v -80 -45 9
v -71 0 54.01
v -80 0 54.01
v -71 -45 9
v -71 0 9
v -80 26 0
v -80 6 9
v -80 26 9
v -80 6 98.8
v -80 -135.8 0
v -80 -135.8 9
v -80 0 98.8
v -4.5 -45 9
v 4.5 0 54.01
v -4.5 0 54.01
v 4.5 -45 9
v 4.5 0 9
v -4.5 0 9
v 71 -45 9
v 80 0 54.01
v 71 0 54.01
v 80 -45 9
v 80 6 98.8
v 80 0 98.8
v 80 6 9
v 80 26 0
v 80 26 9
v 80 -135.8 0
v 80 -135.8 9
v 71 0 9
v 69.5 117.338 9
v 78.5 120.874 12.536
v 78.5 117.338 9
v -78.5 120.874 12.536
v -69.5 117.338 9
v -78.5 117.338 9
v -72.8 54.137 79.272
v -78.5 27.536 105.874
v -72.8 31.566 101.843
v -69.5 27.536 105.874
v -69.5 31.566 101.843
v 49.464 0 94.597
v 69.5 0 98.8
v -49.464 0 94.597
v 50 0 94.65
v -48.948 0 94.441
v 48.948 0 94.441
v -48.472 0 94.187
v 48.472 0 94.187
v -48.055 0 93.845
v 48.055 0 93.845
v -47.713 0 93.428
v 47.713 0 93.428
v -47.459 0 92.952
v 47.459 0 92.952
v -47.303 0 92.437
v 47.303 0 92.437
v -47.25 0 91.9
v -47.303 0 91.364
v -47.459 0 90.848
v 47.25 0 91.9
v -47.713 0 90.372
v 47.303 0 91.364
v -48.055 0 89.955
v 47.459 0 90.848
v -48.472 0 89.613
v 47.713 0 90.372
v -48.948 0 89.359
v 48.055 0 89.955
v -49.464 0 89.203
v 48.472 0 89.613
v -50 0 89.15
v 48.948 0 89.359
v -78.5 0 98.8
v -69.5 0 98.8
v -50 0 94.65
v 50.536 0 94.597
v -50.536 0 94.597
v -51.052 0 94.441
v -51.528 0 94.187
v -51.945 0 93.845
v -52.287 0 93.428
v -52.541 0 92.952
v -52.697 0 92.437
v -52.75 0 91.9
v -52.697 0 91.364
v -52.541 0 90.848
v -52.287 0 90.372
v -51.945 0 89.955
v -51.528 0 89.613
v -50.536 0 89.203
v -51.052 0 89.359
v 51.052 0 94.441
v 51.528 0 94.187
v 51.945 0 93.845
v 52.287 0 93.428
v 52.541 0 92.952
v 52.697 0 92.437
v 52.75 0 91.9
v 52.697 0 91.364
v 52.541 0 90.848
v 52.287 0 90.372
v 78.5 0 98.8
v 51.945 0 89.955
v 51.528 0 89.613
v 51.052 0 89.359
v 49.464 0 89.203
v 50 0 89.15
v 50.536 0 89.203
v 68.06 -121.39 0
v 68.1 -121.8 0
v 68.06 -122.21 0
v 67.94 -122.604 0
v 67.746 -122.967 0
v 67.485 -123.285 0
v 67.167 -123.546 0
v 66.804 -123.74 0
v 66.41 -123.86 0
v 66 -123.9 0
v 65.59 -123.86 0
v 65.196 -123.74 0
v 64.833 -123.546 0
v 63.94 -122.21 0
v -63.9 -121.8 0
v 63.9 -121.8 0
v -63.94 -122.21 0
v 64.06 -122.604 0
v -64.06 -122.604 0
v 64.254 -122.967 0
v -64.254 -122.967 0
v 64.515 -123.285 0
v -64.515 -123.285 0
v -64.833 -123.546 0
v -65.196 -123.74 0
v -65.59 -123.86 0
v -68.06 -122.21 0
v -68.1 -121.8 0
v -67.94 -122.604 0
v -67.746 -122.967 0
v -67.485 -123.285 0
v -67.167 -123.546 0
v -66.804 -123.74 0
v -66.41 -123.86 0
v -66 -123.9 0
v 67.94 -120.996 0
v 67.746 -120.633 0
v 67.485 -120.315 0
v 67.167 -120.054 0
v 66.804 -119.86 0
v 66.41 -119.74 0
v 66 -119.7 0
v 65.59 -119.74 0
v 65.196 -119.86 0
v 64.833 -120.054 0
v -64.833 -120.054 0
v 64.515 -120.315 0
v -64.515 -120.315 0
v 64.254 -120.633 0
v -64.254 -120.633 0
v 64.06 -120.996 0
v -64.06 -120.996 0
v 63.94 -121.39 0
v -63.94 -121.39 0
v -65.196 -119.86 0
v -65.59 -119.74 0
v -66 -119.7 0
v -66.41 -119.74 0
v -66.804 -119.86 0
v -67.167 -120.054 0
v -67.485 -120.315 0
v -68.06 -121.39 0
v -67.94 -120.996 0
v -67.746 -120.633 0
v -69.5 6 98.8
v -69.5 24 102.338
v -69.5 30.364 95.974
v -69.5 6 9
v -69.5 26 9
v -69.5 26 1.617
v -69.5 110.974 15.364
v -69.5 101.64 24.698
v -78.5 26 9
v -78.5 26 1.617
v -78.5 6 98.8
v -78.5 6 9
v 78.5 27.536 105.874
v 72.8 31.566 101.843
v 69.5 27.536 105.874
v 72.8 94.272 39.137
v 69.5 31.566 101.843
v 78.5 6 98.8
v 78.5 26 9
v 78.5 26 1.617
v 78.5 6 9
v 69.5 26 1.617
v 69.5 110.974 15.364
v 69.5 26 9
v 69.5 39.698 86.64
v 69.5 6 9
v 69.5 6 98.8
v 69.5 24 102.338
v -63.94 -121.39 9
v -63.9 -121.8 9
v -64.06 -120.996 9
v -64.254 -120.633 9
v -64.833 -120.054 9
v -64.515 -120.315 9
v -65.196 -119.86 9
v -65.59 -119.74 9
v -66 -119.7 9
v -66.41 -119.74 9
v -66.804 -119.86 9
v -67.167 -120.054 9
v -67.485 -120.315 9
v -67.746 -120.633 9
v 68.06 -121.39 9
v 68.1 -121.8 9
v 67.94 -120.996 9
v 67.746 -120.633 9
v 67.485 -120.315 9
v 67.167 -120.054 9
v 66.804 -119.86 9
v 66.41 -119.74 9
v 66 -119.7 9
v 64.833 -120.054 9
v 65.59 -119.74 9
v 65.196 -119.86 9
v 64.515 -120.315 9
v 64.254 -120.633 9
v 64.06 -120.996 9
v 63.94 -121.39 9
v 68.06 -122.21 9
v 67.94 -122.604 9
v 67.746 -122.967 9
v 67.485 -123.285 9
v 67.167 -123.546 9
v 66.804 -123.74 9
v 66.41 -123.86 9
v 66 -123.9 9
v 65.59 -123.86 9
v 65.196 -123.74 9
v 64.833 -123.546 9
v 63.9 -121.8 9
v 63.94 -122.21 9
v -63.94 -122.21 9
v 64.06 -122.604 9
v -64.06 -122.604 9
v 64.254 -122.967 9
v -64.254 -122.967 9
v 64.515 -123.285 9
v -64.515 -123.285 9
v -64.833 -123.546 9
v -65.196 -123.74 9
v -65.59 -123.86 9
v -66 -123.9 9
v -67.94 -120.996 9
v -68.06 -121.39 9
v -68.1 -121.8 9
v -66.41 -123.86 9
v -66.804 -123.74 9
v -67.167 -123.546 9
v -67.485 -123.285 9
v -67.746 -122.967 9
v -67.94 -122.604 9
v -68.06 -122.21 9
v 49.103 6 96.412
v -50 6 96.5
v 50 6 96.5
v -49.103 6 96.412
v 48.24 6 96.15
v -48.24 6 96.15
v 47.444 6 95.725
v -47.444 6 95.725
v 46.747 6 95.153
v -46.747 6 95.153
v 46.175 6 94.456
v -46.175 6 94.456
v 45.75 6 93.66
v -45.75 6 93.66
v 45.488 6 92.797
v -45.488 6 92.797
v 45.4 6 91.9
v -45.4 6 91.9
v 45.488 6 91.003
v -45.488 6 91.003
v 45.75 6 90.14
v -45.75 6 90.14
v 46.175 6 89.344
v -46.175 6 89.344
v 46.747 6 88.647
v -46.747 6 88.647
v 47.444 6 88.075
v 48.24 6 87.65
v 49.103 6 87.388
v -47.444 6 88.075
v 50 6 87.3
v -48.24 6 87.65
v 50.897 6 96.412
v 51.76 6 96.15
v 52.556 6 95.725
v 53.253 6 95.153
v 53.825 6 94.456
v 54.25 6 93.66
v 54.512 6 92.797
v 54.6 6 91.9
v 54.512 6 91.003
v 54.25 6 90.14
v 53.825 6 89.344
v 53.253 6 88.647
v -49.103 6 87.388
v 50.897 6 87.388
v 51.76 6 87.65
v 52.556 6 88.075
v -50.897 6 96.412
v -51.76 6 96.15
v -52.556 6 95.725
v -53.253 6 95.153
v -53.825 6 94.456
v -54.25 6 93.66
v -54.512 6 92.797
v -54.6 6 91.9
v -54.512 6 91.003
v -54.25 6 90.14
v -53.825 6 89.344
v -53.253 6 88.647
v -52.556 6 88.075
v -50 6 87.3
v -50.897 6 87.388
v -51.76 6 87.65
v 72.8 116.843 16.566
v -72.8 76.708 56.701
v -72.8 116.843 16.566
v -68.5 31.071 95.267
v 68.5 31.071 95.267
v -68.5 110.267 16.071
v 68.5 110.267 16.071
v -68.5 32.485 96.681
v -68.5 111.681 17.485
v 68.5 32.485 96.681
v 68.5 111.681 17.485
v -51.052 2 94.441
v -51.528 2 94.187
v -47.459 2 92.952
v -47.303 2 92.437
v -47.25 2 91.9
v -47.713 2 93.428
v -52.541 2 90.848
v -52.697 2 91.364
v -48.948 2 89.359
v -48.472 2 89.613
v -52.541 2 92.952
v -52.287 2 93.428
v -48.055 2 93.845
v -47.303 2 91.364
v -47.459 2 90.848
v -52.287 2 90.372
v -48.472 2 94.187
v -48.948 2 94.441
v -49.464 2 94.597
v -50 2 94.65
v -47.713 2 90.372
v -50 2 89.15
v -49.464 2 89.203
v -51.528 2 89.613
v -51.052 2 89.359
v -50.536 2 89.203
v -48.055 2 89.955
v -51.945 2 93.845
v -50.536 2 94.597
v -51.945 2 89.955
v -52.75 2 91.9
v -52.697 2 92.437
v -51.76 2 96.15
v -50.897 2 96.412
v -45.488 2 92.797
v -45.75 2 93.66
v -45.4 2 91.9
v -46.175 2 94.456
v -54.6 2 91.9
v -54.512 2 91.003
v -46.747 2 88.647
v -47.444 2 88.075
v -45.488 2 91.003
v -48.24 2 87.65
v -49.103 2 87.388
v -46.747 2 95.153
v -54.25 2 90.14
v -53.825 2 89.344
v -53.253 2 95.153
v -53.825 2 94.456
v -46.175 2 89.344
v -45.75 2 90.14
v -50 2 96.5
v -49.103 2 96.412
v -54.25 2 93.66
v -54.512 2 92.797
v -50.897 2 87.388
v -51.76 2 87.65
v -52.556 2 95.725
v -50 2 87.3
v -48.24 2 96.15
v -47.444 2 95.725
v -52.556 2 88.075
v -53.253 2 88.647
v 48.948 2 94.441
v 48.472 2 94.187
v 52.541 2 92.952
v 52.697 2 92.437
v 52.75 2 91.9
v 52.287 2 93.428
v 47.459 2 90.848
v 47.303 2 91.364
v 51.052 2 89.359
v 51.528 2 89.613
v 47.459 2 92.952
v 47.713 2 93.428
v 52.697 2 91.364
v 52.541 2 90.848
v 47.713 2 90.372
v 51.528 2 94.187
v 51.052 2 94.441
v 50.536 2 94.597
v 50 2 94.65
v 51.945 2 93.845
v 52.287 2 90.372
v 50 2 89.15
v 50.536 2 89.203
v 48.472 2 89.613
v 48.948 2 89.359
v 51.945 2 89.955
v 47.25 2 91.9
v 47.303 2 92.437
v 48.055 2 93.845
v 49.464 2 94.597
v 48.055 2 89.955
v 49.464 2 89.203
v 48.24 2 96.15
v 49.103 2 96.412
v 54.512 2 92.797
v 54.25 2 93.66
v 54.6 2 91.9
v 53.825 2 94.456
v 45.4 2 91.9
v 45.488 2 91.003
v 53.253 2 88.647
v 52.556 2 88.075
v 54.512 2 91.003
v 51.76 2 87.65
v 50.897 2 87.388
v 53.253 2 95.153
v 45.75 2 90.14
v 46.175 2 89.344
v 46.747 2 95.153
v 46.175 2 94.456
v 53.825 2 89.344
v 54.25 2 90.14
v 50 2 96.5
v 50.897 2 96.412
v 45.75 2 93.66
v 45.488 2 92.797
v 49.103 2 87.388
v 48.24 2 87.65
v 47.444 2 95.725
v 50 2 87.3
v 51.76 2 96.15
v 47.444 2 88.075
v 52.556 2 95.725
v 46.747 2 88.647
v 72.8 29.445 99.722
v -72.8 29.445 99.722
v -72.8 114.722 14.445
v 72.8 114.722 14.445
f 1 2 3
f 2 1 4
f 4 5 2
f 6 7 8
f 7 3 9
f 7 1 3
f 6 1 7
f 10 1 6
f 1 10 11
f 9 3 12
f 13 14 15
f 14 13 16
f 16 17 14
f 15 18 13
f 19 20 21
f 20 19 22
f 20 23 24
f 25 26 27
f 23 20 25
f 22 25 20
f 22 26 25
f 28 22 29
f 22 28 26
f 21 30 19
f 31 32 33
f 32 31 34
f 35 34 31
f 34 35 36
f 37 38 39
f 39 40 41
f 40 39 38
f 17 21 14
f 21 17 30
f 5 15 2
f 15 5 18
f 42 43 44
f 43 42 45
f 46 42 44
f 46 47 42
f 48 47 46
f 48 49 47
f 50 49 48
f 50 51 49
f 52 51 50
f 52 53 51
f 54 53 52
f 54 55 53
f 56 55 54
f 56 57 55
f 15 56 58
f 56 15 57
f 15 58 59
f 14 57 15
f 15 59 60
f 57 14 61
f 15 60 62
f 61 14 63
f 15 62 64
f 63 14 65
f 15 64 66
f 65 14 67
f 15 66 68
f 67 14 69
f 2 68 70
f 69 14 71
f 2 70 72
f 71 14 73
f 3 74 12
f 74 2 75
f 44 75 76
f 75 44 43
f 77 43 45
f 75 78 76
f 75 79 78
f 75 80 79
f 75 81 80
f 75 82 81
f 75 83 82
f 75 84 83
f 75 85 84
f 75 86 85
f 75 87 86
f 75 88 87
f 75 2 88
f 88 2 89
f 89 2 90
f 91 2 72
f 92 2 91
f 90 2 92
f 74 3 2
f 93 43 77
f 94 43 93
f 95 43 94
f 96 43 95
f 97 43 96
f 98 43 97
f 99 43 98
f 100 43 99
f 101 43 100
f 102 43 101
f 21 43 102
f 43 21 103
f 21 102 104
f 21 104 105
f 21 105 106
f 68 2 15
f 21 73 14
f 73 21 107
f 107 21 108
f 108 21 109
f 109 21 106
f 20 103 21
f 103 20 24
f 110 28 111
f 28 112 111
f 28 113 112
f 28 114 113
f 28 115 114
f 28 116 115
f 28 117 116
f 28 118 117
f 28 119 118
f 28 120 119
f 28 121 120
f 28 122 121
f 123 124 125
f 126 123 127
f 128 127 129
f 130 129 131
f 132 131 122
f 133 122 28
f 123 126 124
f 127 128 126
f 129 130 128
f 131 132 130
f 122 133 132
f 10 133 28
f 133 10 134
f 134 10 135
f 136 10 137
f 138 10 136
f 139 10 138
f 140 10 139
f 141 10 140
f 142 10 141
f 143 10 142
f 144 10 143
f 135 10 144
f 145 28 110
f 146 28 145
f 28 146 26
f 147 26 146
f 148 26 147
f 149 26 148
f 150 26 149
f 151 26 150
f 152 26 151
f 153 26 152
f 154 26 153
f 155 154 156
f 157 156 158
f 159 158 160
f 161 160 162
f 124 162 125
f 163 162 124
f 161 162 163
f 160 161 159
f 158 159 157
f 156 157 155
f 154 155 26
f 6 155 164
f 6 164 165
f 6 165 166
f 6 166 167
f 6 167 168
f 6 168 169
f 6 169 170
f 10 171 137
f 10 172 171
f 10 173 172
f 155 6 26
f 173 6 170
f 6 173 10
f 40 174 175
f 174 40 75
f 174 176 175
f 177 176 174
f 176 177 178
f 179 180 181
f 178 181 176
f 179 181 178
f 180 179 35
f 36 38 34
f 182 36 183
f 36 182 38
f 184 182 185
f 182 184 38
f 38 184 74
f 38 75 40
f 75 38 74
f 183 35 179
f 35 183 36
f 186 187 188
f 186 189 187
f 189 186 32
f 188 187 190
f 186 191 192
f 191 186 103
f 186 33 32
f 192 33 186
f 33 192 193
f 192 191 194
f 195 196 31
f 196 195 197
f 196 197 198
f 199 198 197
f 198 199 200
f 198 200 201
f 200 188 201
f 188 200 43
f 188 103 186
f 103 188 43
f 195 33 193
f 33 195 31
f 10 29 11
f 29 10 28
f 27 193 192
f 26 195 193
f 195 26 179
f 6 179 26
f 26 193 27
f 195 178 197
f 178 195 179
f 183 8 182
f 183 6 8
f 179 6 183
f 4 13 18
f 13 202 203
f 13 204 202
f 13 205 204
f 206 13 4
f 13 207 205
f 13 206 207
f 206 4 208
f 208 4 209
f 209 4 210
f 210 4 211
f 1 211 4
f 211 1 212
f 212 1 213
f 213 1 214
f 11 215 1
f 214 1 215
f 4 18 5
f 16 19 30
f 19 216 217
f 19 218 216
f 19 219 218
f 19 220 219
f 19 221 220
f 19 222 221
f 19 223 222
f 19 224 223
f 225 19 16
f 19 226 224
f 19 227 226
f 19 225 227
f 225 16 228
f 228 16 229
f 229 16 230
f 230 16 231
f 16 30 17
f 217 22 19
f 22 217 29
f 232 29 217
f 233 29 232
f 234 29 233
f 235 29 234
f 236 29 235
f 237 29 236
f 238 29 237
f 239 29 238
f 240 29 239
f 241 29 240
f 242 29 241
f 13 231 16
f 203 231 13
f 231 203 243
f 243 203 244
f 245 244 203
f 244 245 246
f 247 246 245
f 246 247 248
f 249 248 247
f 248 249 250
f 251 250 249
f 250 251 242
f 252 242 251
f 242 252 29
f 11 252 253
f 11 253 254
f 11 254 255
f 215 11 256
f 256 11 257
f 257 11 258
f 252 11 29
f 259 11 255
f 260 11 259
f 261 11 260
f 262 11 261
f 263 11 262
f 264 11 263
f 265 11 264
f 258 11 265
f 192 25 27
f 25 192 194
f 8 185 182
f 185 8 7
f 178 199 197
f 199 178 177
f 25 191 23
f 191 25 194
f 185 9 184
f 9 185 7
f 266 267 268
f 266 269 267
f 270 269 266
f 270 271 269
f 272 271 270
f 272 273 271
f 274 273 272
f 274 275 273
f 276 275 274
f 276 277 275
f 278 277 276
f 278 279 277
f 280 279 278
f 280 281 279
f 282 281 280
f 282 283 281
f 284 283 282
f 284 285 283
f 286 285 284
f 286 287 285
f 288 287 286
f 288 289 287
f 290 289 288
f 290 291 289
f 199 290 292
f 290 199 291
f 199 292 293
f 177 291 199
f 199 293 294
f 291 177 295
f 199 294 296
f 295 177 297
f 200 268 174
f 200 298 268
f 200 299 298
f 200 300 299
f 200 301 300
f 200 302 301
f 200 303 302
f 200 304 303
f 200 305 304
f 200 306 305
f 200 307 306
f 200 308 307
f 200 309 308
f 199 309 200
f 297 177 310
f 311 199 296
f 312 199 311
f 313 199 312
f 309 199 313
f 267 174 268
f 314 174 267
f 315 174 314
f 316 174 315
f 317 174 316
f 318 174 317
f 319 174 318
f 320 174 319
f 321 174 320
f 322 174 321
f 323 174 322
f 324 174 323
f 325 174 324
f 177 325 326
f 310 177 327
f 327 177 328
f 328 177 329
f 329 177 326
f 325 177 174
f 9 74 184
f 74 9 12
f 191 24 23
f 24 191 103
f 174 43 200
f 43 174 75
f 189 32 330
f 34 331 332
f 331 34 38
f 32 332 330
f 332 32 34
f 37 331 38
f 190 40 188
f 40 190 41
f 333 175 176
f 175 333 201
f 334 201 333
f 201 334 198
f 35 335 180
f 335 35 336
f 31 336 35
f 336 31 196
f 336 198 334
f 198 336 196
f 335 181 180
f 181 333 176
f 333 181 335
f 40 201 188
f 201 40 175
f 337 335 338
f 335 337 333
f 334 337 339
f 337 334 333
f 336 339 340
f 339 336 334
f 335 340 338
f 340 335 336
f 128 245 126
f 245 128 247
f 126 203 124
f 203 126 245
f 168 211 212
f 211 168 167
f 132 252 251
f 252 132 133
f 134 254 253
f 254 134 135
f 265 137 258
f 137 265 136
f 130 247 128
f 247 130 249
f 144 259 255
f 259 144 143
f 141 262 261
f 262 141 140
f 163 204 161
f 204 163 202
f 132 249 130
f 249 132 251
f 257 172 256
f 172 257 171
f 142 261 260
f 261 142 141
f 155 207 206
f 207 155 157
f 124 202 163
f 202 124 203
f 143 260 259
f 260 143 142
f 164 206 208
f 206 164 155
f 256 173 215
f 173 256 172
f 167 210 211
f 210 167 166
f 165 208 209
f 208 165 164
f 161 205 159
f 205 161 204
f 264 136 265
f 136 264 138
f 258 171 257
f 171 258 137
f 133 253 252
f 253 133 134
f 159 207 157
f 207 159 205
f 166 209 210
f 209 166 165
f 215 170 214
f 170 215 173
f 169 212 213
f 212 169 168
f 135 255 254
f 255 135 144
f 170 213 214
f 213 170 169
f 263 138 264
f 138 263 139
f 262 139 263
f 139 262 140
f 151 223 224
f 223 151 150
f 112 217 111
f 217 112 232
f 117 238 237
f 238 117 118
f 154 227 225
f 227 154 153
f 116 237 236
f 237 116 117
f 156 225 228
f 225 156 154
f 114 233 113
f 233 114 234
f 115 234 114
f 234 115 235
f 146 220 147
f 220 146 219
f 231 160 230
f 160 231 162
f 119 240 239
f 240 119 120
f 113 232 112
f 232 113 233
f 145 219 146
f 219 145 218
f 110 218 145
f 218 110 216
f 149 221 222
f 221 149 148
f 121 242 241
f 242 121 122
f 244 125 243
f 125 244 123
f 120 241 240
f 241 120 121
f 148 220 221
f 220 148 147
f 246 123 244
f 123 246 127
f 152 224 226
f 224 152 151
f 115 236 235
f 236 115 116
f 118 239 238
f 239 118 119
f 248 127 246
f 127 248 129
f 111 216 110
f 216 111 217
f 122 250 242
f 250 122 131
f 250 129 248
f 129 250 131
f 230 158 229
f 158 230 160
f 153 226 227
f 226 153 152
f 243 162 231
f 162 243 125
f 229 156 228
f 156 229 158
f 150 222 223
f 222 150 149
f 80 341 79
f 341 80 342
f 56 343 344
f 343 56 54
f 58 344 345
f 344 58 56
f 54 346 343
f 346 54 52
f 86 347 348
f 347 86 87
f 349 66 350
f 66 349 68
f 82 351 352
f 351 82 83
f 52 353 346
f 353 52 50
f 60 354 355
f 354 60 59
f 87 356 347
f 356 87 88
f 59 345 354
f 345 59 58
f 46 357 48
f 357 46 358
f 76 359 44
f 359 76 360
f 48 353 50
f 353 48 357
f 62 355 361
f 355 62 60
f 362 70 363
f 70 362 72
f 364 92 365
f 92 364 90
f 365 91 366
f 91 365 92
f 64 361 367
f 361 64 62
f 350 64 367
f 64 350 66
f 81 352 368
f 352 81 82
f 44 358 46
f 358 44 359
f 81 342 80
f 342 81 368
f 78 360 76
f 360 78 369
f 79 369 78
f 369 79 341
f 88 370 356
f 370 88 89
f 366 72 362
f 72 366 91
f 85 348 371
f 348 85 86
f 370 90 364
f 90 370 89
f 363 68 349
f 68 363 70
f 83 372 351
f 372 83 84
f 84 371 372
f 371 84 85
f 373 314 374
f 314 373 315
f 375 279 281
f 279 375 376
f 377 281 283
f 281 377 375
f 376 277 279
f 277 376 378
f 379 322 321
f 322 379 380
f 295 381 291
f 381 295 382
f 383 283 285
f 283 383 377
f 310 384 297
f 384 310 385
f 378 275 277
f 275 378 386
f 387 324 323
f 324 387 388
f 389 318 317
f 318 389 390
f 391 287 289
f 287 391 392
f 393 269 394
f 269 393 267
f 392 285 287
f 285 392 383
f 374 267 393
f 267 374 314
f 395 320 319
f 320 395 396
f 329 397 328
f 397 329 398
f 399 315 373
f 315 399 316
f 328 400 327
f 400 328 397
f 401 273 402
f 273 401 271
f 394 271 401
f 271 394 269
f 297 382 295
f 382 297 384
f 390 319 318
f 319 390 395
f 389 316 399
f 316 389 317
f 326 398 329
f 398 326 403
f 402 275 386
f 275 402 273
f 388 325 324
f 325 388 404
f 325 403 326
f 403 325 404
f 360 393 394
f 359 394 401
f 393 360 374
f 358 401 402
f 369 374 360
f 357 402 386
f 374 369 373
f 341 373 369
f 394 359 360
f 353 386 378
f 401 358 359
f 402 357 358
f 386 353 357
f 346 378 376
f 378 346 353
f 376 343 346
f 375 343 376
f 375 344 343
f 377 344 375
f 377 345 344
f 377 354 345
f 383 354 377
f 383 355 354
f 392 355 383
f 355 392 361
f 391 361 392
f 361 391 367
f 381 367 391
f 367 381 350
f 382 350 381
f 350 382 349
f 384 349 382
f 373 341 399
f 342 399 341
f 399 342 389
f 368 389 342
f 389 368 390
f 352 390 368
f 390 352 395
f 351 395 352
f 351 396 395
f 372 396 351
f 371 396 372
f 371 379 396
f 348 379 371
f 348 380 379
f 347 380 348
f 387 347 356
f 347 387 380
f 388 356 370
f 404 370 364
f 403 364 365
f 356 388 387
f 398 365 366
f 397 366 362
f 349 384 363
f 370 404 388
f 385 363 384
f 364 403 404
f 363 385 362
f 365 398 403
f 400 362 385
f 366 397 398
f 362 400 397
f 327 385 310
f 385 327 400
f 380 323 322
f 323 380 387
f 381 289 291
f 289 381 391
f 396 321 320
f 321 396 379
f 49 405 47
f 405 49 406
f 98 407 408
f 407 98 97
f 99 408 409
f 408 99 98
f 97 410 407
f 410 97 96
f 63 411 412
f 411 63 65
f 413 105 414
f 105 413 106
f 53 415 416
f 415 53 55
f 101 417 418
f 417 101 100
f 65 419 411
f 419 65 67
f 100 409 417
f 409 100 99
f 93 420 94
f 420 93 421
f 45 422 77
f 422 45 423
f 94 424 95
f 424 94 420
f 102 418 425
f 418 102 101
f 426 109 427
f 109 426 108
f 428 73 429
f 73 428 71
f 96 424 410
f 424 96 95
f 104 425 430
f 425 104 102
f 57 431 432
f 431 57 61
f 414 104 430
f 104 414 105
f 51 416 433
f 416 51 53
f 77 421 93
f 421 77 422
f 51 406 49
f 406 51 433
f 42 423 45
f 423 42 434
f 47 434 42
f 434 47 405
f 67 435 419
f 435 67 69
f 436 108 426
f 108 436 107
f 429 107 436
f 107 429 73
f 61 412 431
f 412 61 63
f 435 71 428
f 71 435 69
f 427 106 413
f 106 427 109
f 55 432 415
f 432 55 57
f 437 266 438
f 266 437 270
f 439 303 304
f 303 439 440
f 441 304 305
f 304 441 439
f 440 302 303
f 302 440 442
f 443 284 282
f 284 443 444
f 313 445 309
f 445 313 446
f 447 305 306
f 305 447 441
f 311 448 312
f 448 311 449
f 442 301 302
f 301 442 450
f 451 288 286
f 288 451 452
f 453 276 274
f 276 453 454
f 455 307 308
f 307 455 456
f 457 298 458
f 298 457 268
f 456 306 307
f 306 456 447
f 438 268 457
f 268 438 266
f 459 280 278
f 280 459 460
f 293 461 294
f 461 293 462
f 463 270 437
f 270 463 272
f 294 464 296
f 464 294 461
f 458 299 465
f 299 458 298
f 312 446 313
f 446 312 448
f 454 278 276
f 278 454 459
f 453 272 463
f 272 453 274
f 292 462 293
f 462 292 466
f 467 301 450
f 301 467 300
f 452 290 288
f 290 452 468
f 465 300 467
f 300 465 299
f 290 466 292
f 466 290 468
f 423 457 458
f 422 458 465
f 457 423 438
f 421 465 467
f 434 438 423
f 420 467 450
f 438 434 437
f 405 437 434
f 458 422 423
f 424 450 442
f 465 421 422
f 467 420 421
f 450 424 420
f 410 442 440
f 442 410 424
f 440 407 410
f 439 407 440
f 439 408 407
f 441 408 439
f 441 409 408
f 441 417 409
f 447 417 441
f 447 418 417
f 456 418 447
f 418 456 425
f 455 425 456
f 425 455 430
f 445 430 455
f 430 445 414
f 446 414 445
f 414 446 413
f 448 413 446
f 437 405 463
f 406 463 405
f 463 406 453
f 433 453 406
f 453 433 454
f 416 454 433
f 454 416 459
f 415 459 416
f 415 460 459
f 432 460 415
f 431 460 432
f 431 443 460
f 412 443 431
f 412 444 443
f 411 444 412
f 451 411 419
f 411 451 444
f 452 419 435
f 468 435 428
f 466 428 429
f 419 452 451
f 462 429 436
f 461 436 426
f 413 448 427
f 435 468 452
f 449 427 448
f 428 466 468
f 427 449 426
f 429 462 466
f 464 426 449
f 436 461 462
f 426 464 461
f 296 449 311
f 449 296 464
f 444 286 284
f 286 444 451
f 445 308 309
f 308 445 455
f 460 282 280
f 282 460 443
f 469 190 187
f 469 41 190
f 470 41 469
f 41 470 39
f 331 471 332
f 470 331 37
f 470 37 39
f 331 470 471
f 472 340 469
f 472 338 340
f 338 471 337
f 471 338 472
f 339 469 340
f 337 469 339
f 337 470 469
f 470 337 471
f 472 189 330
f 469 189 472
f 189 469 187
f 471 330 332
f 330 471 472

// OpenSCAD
include <../lib/meshtastic-drybag-node-lib.scad>;
$fn = 40;
rear_frame_print();
